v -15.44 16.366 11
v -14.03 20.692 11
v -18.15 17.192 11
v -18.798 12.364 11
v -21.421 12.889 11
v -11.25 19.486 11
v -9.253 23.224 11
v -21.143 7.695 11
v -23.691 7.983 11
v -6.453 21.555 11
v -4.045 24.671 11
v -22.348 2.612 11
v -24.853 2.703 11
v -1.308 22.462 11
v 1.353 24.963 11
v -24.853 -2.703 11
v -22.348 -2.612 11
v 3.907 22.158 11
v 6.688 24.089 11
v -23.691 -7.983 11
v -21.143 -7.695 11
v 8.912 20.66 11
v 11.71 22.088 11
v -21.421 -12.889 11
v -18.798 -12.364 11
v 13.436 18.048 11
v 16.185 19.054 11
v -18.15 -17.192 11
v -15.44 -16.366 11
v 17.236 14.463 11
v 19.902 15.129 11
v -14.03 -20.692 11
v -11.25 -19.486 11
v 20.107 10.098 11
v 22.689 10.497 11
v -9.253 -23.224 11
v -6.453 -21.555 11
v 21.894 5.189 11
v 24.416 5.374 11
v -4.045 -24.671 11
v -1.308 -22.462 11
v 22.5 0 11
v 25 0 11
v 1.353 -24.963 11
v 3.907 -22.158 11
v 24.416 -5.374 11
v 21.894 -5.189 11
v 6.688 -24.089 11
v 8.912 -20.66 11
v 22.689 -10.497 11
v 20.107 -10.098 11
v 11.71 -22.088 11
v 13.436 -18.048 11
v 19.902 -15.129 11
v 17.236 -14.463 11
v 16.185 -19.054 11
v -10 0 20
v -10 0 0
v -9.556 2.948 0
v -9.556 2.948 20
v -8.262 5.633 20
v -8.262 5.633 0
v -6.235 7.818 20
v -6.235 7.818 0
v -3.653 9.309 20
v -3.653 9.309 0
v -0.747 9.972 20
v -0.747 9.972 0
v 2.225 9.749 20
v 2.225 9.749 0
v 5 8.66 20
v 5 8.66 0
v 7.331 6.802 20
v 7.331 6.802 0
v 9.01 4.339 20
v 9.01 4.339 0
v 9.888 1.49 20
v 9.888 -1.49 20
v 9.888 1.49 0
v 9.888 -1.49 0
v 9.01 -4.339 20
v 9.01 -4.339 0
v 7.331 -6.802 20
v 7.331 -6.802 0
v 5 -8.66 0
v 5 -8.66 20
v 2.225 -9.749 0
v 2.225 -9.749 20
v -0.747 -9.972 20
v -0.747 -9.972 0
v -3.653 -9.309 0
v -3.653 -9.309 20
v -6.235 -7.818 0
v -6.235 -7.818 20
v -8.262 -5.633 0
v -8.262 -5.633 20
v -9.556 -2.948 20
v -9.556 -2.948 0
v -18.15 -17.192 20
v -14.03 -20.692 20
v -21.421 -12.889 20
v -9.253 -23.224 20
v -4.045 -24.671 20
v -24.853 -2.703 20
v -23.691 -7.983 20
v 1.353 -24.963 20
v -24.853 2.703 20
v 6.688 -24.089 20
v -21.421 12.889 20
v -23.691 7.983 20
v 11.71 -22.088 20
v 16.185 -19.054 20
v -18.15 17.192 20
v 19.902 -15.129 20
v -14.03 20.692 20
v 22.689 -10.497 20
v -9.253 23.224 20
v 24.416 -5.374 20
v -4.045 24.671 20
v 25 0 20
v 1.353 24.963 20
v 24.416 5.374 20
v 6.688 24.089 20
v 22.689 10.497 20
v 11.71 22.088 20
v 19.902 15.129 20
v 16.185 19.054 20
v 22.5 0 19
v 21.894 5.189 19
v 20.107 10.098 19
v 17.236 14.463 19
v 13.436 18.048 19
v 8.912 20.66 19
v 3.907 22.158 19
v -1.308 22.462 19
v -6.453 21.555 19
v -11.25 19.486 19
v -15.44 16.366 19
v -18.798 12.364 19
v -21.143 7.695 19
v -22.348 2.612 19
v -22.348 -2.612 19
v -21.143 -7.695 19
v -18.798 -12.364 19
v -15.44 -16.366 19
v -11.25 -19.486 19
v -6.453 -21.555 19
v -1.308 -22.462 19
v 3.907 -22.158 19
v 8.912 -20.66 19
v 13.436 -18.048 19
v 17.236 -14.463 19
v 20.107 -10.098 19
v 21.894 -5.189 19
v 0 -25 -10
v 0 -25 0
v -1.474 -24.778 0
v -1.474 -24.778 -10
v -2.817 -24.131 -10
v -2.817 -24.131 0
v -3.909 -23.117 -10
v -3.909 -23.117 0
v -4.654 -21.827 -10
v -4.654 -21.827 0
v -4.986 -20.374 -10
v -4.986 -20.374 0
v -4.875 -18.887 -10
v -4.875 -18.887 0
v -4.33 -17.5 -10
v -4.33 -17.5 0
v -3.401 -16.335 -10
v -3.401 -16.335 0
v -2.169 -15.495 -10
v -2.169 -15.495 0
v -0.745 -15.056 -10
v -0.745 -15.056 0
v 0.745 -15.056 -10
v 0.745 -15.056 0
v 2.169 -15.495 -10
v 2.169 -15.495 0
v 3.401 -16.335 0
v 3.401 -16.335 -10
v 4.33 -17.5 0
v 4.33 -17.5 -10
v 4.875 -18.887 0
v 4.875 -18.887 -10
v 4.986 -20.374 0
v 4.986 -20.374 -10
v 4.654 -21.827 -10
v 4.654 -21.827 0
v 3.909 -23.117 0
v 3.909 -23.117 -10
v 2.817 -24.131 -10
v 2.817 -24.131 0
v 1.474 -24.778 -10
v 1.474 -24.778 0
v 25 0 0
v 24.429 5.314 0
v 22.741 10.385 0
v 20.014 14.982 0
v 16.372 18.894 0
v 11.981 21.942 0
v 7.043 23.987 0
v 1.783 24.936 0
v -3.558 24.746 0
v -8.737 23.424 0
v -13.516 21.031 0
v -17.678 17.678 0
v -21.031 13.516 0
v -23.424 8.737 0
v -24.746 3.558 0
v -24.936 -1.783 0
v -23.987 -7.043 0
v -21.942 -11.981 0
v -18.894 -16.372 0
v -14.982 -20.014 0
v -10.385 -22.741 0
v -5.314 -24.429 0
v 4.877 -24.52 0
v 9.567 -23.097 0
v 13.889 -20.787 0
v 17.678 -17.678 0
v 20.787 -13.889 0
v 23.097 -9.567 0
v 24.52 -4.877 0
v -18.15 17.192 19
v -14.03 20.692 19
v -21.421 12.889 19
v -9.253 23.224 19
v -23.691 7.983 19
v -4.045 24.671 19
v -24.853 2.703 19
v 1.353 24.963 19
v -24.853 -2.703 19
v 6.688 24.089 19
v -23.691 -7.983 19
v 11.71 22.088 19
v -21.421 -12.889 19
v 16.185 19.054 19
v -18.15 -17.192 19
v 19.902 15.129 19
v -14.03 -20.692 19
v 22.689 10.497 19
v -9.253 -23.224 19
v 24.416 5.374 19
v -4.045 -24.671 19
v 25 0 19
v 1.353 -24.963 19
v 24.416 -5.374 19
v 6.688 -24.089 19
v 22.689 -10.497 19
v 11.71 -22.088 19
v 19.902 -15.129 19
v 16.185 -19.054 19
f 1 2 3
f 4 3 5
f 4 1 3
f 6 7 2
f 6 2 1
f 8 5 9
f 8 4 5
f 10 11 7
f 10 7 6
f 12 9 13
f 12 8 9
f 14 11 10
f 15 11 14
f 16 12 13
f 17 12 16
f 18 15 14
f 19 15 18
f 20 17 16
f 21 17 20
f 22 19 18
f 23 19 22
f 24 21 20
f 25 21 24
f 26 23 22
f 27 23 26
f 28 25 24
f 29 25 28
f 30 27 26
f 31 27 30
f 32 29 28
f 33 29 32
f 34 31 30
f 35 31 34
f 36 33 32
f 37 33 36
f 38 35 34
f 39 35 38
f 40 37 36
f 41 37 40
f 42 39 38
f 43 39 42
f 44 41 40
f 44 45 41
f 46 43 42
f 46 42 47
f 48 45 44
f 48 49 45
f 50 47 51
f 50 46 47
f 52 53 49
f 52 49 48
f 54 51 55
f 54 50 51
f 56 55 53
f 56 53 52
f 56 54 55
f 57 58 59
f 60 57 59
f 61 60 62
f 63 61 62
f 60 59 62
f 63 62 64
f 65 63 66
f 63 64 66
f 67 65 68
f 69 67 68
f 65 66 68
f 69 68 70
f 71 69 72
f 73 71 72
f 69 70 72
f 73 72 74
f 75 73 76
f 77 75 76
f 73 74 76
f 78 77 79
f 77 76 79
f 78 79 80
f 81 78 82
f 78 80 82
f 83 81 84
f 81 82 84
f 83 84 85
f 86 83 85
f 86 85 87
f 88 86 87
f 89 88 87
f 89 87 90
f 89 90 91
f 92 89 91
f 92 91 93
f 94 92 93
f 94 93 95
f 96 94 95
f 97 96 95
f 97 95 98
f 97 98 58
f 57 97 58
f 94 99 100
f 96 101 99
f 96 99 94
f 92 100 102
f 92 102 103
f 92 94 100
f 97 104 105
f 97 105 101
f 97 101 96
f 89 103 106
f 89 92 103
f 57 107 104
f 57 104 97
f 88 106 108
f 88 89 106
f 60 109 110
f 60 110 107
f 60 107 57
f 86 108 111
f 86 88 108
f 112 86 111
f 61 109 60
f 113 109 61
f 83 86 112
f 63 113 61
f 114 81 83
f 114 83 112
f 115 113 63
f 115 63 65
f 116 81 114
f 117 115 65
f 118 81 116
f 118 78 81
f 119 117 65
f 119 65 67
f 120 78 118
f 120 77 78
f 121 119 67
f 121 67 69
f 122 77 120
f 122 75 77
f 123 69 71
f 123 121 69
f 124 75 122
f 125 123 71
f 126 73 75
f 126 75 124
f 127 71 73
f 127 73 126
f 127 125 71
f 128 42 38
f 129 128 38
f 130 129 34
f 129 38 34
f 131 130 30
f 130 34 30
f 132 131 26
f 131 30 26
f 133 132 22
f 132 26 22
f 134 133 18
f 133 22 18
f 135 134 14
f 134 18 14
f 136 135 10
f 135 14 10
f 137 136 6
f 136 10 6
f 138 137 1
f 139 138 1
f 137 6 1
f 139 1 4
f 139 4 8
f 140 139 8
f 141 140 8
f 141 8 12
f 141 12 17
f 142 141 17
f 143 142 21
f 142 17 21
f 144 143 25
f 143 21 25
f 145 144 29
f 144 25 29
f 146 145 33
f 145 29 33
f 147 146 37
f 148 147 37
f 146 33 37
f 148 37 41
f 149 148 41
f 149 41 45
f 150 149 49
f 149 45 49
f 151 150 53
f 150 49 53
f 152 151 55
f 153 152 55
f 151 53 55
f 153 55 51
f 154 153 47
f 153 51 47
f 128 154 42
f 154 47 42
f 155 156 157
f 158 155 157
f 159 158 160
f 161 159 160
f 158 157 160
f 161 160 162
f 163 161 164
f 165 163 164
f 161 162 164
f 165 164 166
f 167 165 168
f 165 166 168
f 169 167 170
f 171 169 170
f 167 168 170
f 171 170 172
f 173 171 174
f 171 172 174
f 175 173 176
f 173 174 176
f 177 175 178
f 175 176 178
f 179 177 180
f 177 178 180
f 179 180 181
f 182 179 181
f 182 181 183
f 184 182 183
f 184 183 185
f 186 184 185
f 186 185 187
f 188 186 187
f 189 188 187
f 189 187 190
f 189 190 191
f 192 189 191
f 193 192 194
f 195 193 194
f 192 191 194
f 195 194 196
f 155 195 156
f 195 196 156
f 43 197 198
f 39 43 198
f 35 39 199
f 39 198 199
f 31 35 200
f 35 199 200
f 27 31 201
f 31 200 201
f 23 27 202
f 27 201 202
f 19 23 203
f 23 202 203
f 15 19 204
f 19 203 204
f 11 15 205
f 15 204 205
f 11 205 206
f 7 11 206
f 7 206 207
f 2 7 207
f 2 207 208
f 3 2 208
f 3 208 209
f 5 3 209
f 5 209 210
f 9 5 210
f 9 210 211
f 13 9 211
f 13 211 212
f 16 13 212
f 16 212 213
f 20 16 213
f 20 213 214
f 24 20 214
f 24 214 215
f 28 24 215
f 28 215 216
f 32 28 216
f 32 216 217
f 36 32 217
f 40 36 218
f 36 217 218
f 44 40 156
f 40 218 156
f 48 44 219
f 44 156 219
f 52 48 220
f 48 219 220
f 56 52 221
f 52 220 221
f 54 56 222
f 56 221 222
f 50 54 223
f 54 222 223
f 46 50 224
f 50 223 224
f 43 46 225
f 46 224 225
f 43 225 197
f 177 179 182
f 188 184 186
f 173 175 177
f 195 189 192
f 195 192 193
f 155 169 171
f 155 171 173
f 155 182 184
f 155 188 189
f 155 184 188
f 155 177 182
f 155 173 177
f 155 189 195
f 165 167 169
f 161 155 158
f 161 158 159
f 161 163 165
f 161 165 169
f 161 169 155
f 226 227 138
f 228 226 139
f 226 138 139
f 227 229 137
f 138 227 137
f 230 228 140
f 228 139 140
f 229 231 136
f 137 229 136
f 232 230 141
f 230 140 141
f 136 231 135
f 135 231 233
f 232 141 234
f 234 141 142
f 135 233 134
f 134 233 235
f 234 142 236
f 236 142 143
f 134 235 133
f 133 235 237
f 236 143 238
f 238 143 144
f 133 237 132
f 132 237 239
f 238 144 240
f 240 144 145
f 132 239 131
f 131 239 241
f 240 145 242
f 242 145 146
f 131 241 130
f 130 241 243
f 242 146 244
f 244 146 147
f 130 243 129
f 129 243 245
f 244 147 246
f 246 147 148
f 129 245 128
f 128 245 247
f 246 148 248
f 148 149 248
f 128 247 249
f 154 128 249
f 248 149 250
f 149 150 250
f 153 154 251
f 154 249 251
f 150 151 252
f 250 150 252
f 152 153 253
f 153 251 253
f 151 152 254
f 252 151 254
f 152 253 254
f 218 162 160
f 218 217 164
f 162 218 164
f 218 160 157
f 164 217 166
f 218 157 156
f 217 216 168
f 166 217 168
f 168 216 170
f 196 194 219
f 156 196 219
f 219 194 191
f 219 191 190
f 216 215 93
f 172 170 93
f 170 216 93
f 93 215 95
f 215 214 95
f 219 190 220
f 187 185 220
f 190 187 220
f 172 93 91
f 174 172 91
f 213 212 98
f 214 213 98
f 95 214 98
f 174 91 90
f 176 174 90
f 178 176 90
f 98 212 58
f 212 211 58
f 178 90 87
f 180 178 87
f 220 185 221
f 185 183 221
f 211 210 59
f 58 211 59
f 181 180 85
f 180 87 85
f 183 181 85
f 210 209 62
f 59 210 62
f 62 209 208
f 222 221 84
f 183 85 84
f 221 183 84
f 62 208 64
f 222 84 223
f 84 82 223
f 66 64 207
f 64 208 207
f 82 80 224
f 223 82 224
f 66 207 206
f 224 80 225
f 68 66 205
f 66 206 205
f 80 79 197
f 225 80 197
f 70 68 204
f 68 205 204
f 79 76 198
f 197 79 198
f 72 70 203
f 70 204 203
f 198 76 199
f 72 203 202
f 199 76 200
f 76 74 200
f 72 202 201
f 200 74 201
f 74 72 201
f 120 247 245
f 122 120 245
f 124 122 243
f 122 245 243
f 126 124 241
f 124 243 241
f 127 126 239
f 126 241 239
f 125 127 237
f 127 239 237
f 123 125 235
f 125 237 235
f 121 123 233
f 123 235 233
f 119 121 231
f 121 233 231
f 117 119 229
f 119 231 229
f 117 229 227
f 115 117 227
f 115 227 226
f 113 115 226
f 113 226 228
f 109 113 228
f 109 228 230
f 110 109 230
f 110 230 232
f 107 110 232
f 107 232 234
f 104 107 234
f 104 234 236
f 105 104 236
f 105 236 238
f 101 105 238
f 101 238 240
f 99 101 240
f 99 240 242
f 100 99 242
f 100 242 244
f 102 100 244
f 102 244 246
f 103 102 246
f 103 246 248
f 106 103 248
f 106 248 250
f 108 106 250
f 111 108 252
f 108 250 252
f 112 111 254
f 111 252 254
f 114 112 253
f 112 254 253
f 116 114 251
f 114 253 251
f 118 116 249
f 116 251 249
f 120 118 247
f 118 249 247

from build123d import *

# Parameters (mm, degrees)
SKETCH1_R           = 25
BOSS_EXTRUDE1_DEPTH = 20
SKETCH2_R           = 5
BOSS_EXTRUDE2_DEPTH = 10
SKETCH3_R           = 10
CUT_EXTRUDE1_DEPTH  = 41.620192023
CUT_EXTRUDE2_START  = -9
SKETCH5_R           = 25
SKETCH5_R_2         = 22.5
CUT_EXTRUDE2_DEPTH  = 8


with BuildPart() as part:
    # Sketch1 → Boss-Extrude1 (new body)
    with BuildSketch(Plane.XY):
        Circle(SKETCH1_R)
    extrude(amount=BOSS_EXTRUDE1_DEPTH)

    # Sketch2 → Boss-Extrude2 (add)
    with BuildSketch(Plane(origin=(0, 0, 0), x_dir=(-1, 0, 0), z_dir=(0, 0, -1))):
        with Locations(Location((0, -20, 0), (0, 0, 270))):
            Circle(SKETCH2_R)
    extrude(amount=BOSS_EXTRUDE2_DEPTH)

    # Sketch3 → Cut-Extrude1 (cut, through all)
    with BuildSketch(Plane(origin=(0, 0, 0), x_dir=(-1, 0, 0), z_dir=(0, 0, -1))):
        Circle(SKETCH3_R)
    extrude(amount=-CUT_EXTRUDE1_DEPTH, mode=Mode.SUBTRACT)

    # Sketch5 → Cut-Extrude2 (cut)
    with BuildSketch(Plane.XY.offset(20).offset(CUT_EXTRUDE2_START)):
        with Locations(Location((0, 0, 0), (0, 0, 270))):
            Circle(SKETCH5_R)
        Circle(SKETCH5_R_2, mode=Mode.SUBTRACT)
    extrude(amount=CUT_EXTRUDE2_DEPTH, mode=Mode.SUBTRACT)


solid = part.part
